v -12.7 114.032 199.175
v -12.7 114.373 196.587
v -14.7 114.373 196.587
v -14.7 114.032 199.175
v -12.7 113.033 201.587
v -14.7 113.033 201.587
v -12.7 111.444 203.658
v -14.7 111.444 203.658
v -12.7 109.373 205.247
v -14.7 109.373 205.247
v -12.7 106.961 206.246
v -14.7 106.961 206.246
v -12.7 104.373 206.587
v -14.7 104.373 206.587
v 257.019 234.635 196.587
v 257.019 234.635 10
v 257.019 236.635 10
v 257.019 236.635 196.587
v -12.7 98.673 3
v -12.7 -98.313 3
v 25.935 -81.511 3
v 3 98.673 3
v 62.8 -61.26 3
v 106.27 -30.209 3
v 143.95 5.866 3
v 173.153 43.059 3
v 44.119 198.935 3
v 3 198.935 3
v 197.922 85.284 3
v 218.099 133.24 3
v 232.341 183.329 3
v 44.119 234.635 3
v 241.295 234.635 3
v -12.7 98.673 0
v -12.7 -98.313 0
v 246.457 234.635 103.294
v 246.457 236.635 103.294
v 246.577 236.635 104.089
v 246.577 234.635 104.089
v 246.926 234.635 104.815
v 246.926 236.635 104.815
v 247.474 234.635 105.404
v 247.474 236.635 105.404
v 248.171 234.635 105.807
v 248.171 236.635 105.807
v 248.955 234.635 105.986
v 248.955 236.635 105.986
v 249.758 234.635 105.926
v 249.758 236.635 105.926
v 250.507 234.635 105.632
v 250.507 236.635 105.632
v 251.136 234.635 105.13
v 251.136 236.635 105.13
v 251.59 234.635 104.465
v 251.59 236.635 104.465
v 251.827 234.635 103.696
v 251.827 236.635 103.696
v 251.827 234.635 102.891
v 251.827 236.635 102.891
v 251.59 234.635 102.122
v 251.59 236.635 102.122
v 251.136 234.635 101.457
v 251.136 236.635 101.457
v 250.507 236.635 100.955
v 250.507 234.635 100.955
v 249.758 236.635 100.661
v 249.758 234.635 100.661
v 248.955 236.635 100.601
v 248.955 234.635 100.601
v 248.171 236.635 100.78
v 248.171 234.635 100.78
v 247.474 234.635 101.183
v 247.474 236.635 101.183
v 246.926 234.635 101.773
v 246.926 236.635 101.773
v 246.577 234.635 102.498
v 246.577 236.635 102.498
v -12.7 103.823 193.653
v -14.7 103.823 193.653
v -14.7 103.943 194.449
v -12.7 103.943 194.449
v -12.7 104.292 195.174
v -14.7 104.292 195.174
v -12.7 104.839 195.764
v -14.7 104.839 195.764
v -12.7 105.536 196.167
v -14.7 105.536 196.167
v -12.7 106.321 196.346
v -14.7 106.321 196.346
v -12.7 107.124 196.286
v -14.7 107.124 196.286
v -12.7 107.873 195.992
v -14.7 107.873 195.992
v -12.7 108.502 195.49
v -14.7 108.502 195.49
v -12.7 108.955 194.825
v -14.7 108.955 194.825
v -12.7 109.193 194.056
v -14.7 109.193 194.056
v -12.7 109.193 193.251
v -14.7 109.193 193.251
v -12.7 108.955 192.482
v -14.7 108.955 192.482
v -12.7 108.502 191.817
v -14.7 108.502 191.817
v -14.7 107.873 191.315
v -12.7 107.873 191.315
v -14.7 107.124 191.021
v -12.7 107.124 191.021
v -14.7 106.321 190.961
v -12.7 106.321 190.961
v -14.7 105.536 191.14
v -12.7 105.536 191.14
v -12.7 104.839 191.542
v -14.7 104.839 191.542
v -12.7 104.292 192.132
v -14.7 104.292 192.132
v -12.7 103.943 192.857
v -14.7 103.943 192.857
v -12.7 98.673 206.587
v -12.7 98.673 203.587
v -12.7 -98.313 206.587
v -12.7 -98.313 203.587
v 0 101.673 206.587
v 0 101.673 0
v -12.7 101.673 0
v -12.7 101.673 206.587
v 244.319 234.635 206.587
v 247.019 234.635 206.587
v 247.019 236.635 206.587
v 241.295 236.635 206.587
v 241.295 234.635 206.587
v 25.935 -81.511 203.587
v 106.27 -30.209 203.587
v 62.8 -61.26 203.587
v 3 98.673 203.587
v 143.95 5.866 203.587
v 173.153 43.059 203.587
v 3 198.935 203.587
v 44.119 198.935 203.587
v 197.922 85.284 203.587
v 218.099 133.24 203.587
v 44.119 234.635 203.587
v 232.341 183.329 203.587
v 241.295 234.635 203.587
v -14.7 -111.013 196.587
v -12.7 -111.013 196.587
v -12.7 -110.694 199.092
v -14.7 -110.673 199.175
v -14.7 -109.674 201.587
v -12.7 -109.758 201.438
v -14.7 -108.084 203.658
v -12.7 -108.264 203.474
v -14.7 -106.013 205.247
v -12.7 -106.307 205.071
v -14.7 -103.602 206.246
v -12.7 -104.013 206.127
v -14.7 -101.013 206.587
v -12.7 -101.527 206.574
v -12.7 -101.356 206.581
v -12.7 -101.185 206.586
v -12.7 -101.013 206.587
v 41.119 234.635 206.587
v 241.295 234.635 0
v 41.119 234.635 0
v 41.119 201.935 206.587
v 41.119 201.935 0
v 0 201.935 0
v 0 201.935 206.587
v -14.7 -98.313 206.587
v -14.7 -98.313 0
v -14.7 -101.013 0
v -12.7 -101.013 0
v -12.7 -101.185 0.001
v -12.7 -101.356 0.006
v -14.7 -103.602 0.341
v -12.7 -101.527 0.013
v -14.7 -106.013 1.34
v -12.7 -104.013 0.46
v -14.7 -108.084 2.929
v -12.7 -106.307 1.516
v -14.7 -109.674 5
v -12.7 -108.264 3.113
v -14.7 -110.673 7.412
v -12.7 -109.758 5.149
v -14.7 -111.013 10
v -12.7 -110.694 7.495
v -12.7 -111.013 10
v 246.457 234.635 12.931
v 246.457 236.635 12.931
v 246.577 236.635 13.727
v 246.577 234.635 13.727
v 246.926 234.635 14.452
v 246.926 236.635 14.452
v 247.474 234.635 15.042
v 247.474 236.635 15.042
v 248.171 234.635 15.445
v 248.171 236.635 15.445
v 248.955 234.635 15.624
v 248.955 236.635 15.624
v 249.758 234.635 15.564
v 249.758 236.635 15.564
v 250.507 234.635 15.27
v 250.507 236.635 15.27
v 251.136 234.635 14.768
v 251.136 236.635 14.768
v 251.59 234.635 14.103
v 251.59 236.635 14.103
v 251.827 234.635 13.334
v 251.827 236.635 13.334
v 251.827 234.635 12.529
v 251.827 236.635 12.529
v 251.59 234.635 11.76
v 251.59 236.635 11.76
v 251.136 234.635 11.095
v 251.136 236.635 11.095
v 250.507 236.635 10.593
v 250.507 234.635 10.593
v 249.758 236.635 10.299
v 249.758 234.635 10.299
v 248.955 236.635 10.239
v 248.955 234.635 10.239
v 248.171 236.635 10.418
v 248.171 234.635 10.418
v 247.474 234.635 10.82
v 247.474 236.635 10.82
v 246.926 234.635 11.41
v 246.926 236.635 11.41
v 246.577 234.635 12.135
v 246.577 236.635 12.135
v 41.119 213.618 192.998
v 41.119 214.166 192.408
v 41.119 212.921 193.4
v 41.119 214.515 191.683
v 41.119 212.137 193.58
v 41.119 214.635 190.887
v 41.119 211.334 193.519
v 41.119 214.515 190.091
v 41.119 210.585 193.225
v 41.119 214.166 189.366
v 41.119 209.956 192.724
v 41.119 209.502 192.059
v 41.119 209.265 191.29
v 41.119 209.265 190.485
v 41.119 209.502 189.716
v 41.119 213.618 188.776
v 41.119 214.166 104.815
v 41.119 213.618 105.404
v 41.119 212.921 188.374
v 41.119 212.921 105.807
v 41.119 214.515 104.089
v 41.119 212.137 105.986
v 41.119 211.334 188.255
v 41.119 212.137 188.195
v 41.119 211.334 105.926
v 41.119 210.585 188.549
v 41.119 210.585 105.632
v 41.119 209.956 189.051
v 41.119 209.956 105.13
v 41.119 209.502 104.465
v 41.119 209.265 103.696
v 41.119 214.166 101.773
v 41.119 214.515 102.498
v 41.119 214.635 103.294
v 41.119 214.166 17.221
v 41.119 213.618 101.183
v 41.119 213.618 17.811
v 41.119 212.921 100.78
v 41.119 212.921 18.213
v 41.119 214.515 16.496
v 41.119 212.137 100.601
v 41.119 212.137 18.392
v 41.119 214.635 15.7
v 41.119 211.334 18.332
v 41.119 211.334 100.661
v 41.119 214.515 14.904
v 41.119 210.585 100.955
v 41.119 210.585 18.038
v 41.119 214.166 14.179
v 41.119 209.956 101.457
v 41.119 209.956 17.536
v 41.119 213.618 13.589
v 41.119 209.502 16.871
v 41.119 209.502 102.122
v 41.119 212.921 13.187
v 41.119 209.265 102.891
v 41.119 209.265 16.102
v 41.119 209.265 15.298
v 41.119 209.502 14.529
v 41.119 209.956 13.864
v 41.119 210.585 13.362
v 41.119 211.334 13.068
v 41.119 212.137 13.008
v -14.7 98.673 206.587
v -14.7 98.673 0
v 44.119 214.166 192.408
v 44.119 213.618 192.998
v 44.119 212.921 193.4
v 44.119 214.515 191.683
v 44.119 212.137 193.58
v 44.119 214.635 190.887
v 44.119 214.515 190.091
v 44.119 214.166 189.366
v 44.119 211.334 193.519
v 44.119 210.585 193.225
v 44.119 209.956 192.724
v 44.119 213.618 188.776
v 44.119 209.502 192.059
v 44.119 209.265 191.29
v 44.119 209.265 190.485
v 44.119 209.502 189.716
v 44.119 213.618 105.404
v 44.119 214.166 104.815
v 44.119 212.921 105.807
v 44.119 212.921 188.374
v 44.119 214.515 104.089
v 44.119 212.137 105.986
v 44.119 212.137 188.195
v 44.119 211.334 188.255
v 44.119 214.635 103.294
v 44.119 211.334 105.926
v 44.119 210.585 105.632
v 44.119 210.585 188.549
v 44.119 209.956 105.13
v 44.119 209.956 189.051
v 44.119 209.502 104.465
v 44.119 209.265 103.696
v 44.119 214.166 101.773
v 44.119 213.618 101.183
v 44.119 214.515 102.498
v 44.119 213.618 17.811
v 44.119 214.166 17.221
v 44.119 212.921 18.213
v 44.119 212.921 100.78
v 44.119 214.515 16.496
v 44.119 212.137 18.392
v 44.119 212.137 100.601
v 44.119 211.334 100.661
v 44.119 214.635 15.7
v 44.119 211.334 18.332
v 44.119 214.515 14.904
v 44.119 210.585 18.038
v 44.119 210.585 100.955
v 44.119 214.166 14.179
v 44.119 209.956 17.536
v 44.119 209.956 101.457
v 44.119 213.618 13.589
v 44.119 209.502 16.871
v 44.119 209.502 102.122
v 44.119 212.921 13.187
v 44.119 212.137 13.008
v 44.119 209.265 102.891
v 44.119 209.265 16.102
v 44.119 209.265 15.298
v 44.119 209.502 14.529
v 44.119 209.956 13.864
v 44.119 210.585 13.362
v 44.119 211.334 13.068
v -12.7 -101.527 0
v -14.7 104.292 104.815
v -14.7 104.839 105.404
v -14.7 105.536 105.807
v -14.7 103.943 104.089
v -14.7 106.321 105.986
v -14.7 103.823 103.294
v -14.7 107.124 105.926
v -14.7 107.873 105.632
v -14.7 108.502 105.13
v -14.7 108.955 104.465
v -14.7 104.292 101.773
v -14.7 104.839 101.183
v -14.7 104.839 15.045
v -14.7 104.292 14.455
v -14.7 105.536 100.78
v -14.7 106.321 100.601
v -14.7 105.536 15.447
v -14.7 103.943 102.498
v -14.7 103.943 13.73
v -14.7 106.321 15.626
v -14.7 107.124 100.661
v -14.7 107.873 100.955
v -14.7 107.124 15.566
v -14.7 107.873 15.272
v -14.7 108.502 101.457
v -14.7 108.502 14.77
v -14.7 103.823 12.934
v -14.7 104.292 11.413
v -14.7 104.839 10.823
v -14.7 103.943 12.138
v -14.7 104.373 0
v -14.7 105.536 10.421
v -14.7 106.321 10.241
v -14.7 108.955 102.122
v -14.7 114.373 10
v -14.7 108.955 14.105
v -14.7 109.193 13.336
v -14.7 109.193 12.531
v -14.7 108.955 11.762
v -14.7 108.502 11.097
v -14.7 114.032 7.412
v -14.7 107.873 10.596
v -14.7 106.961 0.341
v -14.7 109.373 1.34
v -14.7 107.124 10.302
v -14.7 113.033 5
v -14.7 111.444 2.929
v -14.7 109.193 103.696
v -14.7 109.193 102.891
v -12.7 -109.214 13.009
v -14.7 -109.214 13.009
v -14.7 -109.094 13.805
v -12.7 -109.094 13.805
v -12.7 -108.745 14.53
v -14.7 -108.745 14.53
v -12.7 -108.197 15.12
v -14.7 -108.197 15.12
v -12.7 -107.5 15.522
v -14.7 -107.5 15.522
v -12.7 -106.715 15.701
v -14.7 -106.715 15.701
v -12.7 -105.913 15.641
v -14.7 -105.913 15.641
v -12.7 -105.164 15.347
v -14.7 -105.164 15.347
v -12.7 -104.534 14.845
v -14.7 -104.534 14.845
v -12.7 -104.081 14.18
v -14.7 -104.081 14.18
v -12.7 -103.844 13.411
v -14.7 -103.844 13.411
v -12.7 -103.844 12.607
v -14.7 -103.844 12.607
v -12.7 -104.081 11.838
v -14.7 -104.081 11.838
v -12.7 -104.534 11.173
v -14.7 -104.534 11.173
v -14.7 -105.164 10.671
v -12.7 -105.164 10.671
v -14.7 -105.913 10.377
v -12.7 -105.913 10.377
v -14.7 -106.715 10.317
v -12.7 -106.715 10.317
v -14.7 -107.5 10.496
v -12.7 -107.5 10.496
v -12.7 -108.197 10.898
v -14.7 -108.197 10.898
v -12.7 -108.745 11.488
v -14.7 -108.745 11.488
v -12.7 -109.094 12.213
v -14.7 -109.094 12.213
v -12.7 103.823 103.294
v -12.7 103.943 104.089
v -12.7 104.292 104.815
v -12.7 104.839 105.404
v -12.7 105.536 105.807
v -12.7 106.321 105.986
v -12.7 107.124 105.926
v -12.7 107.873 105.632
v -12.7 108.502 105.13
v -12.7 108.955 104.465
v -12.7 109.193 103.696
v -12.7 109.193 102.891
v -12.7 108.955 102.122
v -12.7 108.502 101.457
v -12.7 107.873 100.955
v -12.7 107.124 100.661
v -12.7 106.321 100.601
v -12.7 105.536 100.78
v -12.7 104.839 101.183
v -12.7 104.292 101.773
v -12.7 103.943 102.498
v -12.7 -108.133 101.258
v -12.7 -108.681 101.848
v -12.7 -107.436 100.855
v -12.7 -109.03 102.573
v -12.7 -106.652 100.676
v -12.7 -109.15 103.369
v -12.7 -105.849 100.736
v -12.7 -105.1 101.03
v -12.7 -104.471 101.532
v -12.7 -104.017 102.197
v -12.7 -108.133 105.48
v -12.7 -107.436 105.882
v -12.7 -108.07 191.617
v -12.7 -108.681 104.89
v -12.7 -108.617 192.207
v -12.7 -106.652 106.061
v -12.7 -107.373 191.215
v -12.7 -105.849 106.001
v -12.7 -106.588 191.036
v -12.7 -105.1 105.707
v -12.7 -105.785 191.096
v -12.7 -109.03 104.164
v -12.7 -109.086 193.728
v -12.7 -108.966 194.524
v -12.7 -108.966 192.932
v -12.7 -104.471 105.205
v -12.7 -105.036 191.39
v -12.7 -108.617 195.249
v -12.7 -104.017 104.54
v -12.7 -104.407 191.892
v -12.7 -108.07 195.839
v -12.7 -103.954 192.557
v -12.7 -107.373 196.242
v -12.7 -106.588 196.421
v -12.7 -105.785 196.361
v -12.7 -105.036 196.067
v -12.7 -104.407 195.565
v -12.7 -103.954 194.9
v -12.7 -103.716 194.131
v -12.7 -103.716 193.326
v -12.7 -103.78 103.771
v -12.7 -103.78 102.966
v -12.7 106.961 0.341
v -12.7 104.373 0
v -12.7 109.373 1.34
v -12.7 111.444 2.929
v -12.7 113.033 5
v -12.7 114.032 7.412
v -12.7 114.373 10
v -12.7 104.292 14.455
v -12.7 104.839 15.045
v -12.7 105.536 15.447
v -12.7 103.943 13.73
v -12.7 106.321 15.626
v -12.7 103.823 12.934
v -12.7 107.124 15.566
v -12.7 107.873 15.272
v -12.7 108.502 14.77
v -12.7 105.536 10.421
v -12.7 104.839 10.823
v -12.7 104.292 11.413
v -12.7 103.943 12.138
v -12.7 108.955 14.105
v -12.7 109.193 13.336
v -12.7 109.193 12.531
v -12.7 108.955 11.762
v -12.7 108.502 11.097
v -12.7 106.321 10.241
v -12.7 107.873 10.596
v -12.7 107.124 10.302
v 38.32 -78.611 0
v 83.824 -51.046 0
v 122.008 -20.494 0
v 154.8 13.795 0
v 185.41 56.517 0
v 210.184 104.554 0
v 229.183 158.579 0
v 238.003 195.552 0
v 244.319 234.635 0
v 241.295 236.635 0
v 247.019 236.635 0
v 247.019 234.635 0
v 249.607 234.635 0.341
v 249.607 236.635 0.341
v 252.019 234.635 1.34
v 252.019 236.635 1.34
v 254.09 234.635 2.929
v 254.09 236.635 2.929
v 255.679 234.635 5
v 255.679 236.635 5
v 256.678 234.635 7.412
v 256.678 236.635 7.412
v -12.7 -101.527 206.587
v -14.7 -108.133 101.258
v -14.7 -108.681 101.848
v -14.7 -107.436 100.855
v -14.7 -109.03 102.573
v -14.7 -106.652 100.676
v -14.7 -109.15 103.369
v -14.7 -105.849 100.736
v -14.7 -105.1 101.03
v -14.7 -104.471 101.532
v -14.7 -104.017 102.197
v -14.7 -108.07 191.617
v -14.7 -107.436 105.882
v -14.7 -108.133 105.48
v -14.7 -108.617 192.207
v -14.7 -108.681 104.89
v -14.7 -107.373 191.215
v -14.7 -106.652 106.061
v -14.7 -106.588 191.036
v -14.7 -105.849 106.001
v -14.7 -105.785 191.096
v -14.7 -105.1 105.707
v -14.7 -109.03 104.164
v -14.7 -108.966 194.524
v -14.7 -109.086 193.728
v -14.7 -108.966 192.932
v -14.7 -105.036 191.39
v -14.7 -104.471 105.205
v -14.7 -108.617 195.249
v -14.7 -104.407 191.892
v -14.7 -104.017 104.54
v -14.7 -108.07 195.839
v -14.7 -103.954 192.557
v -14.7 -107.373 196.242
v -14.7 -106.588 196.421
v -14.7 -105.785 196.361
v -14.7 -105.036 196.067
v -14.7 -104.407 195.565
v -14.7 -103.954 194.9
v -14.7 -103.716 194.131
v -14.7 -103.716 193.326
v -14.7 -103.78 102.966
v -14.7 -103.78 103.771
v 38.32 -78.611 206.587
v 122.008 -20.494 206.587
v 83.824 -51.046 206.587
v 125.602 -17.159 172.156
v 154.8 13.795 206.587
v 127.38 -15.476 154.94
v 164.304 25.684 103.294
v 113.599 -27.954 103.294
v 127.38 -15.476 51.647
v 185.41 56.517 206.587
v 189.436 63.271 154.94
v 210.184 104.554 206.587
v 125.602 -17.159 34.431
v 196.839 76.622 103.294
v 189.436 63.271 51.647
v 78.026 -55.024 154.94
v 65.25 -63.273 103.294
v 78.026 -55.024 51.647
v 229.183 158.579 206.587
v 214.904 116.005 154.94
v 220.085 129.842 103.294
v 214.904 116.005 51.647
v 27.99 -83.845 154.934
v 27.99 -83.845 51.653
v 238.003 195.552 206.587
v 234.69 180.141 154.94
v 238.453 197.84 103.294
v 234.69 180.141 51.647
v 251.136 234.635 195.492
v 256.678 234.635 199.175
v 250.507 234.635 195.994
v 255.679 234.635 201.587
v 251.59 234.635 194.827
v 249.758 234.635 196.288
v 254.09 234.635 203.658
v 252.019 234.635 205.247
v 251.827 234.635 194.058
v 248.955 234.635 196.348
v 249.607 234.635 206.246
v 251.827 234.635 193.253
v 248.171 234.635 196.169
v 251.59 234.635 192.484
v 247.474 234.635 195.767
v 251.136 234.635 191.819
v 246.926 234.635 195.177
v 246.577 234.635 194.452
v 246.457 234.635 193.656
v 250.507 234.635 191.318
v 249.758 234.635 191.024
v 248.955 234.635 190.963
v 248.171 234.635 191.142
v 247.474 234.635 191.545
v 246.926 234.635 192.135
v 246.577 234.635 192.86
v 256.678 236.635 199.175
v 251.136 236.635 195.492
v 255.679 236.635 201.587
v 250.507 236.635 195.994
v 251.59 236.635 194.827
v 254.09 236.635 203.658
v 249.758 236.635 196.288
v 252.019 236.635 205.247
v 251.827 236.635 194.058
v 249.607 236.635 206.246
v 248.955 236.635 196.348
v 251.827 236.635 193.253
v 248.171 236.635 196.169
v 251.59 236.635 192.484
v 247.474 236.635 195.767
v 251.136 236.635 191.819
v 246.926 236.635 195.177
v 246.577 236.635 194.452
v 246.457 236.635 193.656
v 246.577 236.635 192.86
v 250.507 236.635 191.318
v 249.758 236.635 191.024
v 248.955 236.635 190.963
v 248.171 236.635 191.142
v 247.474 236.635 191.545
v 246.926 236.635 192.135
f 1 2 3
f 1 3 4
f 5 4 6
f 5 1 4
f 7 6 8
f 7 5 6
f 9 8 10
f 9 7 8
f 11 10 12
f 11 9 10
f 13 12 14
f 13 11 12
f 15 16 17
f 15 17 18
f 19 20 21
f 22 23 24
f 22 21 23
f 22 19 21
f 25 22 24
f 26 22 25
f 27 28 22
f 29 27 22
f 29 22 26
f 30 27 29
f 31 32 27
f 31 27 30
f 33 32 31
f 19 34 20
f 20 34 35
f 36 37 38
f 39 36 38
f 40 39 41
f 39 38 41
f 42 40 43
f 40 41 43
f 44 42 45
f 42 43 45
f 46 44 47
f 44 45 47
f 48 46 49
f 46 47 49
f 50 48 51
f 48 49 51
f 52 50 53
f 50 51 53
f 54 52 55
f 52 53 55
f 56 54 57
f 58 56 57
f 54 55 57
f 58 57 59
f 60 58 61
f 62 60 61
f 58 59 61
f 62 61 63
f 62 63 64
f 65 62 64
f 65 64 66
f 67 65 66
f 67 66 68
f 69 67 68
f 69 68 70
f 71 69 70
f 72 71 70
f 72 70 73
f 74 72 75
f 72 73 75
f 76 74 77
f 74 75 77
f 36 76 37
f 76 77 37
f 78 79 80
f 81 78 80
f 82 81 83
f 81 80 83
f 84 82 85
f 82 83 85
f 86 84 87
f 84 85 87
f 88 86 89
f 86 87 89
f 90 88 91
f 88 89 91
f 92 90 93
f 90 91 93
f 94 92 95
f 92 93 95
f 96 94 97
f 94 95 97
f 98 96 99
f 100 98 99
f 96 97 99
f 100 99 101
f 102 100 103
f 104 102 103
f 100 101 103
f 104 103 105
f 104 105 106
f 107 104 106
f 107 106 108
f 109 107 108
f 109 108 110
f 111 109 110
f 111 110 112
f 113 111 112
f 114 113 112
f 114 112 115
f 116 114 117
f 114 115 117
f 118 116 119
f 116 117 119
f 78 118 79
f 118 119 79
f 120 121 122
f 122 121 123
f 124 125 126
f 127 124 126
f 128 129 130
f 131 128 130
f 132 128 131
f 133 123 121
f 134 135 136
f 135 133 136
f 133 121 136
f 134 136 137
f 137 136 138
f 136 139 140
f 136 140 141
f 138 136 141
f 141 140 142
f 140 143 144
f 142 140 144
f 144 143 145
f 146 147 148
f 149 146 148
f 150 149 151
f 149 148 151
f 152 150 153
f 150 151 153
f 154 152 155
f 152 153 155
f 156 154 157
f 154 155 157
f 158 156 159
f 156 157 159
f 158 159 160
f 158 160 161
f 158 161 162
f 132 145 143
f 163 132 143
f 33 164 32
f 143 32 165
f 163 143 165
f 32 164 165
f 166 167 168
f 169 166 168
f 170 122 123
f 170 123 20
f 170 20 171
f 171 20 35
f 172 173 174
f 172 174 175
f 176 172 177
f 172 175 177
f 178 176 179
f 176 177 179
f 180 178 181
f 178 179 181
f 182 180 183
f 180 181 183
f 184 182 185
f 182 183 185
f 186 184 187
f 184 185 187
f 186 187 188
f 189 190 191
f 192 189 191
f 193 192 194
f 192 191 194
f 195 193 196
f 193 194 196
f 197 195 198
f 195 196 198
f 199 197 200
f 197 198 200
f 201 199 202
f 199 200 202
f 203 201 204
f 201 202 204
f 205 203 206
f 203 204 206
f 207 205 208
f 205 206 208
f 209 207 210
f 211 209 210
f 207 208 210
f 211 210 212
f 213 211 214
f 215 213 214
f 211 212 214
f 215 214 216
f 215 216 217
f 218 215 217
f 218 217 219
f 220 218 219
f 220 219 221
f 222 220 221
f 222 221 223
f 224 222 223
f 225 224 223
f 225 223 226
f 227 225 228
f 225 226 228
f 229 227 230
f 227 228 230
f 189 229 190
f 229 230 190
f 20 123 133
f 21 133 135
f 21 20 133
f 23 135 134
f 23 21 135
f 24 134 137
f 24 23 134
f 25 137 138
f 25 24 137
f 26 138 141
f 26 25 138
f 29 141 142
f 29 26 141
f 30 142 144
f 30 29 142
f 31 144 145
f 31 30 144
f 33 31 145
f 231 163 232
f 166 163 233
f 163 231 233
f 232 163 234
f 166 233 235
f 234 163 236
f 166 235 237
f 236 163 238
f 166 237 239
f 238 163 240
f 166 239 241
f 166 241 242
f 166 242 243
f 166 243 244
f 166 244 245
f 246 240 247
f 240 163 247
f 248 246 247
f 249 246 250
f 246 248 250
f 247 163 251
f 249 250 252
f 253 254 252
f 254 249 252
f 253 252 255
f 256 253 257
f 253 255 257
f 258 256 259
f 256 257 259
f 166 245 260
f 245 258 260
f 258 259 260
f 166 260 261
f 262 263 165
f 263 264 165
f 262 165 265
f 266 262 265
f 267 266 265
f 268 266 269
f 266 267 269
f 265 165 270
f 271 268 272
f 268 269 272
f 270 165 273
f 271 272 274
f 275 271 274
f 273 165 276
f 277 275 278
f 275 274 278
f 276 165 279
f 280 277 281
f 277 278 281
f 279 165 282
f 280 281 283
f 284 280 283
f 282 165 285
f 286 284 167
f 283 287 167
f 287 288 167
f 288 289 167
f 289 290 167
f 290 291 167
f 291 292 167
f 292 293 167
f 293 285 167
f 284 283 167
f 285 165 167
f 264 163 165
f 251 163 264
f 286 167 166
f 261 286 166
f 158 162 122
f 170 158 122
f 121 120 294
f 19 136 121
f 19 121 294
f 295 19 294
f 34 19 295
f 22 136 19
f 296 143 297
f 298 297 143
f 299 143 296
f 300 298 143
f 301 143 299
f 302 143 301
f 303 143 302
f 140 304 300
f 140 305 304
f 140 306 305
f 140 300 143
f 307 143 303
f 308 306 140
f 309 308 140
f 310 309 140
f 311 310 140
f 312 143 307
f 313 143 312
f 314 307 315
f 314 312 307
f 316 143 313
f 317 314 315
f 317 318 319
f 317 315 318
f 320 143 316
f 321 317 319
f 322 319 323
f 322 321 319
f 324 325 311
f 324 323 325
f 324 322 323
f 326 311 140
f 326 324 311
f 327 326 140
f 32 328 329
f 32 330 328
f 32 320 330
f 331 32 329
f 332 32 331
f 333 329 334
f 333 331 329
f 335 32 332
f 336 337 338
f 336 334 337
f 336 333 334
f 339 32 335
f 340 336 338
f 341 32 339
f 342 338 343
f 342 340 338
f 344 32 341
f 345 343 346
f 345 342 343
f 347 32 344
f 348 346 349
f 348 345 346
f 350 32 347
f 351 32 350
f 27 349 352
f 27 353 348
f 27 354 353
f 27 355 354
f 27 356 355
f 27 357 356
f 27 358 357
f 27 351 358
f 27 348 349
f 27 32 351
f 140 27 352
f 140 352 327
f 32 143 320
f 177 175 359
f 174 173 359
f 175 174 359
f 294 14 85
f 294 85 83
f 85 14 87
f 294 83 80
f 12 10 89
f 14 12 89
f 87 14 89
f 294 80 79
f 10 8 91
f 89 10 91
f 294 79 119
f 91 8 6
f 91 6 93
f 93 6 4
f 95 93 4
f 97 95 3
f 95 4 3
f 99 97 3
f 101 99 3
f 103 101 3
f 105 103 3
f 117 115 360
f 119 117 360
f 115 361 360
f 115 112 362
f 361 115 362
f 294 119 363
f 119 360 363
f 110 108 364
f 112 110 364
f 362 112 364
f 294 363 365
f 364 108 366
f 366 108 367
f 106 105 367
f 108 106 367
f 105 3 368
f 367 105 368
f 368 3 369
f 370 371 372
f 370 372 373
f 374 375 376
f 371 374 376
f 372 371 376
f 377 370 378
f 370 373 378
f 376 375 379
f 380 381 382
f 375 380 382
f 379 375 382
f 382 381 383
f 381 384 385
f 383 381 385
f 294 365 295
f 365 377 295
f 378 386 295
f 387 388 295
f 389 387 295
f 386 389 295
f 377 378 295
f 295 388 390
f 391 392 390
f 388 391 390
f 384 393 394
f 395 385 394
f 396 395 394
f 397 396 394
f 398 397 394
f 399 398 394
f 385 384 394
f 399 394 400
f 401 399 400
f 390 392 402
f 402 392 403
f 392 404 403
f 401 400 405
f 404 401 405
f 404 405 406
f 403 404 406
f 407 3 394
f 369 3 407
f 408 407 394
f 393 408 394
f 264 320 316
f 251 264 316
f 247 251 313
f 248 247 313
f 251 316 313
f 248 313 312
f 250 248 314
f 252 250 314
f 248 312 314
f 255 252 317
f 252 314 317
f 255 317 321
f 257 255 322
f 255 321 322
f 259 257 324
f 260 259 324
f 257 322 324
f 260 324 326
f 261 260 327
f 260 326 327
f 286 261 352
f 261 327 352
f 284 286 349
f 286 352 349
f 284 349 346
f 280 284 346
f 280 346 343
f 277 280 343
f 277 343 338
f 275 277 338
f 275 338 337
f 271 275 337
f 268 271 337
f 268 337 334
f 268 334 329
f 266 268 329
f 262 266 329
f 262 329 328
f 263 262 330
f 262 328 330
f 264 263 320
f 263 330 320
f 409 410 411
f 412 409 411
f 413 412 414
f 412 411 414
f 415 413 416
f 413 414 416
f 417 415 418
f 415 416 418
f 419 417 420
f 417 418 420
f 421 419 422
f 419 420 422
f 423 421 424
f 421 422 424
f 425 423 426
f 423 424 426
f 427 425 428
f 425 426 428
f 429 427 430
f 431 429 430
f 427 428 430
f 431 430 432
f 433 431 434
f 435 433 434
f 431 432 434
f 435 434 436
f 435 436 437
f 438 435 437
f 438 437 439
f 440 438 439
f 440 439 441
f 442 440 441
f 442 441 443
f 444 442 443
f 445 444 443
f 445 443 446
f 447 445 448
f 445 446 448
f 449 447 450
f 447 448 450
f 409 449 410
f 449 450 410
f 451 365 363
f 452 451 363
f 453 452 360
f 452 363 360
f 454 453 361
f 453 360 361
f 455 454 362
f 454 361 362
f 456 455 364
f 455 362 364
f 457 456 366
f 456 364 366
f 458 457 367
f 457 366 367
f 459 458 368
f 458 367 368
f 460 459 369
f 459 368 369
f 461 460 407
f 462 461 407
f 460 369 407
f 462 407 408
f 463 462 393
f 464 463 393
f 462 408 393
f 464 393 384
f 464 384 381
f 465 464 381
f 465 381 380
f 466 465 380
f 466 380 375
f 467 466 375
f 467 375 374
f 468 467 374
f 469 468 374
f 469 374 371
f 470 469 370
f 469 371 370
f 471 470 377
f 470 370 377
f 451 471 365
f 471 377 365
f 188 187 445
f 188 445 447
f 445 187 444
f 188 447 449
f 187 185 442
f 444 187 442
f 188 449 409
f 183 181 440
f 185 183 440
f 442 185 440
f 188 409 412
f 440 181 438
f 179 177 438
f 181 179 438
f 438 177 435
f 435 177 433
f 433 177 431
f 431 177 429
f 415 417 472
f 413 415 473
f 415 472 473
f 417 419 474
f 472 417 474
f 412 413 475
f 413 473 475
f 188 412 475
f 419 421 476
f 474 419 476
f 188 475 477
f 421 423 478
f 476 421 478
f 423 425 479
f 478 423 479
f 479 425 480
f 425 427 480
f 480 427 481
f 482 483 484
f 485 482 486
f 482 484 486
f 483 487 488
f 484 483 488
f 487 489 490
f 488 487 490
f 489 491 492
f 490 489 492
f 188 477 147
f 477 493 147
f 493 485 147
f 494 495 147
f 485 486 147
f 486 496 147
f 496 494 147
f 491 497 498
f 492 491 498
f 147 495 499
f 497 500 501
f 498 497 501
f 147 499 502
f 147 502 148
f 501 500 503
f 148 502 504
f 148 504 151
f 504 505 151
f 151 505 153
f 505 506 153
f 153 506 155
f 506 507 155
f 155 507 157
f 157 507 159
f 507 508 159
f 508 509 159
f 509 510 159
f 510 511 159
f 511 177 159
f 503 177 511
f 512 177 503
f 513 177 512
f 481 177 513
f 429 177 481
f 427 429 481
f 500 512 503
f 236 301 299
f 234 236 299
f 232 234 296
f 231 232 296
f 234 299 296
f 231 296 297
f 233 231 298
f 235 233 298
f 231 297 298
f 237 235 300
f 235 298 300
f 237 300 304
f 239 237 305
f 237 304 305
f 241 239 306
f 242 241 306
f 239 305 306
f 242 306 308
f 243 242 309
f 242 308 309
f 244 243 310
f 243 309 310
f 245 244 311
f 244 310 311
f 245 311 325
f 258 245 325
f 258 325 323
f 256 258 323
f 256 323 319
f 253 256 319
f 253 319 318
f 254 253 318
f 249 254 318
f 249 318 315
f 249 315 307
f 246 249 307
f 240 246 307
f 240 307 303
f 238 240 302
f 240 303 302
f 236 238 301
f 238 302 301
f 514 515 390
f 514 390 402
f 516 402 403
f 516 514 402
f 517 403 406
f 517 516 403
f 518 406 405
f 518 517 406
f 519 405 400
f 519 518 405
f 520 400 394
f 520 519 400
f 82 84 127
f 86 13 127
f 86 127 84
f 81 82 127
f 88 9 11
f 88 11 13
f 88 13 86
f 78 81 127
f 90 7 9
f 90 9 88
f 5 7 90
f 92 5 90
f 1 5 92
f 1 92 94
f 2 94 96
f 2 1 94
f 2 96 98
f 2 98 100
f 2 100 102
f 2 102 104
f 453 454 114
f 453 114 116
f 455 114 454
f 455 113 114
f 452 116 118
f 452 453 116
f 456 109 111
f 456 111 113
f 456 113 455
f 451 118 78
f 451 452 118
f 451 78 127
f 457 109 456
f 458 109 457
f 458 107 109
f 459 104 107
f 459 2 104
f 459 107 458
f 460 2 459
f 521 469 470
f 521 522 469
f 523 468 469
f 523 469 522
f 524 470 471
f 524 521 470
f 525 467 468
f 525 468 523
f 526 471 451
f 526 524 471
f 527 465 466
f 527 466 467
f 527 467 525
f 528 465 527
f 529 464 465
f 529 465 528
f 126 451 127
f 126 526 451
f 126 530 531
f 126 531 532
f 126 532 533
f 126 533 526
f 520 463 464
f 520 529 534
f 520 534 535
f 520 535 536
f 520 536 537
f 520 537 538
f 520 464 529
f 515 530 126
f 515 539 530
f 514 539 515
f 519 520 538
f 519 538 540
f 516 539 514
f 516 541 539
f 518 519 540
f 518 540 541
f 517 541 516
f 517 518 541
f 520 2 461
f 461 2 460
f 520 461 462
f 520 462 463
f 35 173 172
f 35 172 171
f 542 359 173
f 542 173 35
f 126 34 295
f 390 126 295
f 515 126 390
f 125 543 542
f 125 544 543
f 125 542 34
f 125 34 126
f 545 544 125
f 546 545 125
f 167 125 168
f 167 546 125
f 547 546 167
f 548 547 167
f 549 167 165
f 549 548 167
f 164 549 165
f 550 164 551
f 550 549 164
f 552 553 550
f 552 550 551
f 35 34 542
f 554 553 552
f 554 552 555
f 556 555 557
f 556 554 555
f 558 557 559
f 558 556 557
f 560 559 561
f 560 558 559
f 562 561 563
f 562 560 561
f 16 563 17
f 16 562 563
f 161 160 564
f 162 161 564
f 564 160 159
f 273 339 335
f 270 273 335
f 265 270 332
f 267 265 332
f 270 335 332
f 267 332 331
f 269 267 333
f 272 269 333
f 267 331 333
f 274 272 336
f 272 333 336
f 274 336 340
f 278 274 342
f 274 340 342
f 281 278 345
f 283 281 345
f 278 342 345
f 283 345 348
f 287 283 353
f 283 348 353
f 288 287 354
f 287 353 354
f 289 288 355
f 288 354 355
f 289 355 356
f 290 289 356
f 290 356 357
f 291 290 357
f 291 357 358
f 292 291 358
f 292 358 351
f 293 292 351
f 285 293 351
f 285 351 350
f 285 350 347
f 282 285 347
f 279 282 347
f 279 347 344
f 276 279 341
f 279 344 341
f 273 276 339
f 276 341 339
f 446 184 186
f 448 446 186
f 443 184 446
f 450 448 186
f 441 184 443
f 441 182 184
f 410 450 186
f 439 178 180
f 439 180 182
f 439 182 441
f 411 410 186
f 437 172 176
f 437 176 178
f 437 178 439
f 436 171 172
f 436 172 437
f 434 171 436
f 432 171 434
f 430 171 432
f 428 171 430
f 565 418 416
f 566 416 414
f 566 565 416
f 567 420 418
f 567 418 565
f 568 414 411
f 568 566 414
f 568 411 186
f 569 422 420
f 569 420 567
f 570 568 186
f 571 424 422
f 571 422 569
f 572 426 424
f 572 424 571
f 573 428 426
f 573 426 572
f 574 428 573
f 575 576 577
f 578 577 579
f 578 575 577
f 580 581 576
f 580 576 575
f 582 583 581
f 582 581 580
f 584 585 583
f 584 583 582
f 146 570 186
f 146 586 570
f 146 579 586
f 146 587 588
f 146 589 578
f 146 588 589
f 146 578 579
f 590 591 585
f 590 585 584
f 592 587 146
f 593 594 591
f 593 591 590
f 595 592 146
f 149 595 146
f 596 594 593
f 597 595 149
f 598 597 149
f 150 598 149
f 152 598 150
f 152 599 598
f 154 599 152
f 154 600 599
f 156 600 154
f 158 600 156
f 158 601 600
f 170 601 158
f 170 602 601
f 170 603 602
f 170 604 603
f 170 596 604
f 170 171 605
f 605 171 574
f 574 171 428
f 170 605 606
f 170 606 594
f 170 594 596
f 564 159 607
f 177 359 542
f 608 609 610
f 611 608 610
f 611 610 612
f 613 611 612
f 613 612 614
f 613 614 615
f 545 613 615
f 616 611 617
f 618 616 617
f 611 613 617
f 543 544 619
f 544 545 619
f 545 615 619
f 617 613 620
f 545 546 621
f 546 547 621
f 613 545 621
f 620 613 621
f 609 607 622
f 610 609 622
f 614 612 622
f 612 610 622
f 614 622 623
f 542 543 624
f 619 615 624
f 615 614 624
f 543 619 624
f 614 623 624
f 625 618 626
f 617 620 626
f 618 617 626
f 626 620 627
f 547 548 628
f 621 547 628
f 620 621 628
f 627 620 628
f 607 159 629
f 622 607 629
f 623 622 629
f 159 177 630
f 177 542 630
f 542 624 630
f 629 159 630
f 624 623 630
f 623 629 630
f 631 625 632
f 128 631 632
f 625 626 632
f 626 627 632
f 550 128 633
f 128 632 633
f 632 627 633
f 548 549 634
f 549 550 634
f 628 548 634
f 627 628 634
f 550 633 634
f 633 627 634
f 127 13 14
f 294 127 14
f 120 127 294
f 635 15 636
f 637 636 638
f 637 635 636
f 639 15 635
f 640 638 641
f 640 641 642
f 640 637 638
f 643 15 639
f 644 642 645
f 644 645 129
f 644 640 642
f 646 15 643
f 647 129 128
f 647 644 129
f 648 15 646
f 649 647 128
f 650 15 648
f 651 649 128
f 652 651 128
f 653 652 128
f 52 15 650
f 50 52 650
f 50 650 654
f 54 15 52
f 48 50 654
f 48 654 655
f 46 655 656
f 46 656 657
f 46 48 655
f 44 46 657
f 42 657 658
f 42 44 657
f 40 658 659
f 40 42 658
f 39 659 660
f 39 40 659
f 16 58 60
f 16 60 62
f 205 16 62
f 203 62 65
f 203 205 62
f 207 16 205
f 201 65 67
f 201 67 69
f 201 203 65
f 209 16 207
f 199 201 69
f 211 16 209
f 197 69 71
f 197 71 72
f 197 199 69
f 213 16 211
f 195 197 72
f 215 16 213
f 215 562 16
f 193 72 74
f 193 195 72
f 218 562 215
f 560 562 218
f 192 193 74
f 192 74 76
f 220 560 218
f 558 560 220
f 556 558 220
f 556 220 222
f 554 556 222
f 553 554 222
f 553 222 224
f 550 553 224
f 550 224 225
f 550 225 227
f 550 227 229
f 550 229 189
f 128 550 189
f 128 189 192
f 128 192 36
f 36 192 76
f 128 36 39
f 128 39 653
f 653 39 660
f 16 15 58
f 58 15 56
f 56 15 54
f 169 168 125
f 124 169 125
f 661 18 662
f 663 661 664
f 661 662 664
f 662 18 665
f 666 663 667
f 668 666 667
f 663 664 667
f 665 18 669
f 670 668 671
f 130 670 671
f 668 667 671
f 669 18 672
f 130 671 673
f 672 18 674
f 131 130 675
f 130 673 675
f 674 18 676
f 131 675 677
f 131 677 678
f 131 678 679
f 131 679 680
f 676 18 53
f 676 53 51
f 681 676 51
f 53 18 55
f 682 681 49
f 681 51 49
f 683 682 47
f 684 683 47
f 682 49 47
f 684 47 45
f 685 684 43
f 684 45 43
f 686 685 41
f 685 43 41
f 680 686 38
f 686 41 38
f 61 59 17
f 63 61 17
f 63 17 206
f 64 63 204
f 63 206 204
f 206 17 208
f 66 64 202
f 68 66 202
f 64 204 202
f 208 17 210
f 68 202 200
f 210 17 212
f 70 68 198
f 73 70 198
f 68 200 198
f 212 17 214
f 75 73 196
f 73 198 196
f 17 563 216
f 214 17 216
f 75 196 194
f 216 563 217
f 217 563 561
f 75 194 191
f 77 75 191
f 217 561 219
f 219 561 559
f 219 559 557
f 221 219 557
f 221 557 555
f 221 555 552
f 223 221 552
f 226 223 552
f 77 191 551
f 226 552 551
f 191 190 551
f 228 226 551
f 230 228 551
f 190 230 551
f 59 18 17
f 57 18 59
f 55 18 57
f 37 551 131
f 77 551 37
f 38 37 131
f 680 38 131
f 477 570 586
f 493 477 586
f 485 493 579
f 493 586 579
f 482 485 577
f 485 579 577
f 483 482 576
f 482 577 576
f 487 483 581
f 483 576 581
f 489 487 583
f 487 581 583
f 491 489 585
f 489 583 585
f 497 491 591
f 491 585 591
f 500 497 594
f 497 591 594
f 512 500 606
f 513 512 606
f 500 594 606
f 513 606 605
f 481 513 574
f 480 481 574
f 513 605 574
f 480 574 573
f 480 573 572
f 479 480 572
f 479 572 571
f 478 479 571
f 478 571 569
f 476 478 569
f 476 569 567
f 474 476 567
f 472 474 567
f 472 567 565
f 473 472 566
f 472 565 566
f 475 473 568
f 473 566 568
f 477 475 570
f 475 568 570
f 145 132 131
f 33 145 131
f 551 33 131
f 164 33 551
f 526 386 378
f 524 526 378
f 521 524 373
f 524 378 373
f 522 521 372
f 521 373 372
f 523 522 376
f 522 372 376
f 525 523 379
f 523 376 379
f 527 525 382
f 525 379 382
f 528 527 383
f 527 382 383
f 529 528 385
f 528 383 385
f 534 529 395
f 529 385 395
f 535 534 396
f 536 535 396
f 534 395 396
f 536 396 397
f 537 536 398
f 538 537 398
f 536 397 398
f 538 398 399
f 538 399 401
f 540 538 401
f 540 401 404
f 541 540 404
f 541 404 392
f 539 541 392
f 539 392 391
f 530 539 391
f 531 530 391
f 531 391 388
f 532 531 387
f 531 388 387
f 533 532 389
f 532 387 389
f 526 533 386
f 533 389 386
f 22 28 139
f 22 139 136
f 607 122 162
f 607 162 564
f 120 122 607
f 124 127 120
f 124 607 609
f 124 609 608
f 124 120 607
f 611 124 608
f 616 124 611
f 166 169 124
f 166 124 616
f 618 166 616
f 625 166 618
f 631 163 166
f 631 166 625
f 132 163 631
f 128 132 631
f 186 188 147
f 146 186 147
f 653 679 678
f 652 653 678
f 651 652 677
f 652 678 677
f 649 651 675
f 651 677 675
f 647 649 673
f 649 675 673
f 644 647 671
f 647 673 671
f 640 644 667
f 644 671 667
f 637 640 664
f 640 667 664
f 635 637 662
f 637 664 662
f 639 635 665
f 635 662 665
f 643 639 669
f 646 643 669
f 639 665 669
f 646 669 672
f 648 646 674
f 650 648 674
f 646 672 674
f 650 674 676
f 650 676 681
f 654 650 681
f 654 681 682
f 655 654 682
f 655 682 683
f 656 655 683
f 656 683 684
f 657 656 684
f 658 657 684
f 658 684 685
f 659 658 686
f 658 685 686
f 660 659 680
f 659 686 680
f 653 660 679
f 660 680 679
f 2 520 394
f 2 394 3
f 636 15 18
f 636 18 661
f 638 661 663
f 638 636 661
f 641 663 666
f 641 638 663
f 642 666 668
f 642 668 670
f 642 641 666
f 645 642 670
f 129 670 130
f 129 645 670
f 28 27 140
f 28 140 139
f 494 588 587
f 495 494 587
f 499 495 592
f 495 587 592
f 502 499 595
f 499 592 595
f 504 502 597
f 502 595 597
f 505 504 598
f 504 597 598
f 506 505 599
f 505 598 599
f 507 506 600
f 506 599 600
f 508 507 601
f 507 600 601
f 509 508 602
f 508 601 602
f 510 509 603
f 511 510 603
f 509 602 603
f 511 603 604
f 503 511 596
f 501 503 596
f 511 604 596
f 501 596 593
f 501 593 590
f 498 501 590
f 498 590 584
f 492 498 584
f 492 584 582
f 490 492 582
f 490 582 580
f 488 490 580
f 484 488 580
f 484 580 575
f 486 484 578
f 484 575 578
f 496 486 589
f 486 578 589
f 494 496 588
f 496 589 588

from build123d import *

# Parameters (mm, degrees)
BOSS_EXTRUDE3_DEPTH = 206.587093
SHELL1_T            = -3
BOSS_EXTRUDE4_DEPTH = 2
BOSS_EXTRUDE5_DEPTH = 2
SKETCH8_R           = 2.7
CUT_EXTRUDE2_DEPTH  = 3
SKETCH9_R           = 2.7
CUT_EXTRUDE3_DEPTH  = 2
SKETCH11_R          = 2.7
CUT_EXTRUDE4_DEPTH  = 2


with BuildPart() as part:
    # Sketch1 → Boss-Extrude3 (new body)
    with BuildSketch(Plane.XY):
        with BuildLine():
            Line((244.319092767, 234.634840909), (41.119092767, 234.634840909))
            Line((41.119092767, 234.634840909), (41.119092767, 201.934840909))
            Line((41.119092767, 201.934840909), (0, 201.934840909))
            Line((0, 201.934840909), (0, 101.672858907))
            Line((0, 101.672858907), (-12.7, 101.672858907))
            Line((-12.7, 101.672858907), (-12.7, -101.527141093))
            add(Edge.make_bspline(
                [(-12.7, -101.527141093), (212.797902698, -15.185130796), (244.319092767, 234.634840909)],
                knots=[0, 0, 0, 1, 1, 1], degree=2))
        make_face()
    extrude(amount=BOSS_EXTRUDE3_DEPTH)

    # Shell1
    shell1_openings = [part.faces().sort_by_distance(p)[0] for p in [
        (142.719092767, 234.634840909, 103.2935465),
        (-12.7, 0.072858907, 103.2935465),
    ]]
    offset(amount=SHELL1_T, openings=shell1_openings, kind=Kind.INTERSECTION)

    # Sketch4 → Boss-Extrude4 (add)
    with BuildSketch(Plane(origin=(0, 234.634840909, 0), x_dir=(1, 0, 0), z_dir=(0, 1, 0))):
        with BuildLine():
            Line((257.019092767, -10), (257.019092767, -196.587092864))
            ThreePointArc((257.019092767, -196.587092864), (254.090160579, -203.658160676), (247.019092767, -206.587092864))
            Line((247.019092767, -206.587092864), (244.319092767, -206.587092864))
            Line((244.319092767, -206.587092864), (241.295184716, -206.587092864))
            Line((241.295184716, -206.587092864), (241.295184716, 0))
            Line((241.295184716, 0), (247.019092767, 0))
            ThreePointArc((247.019092767, 0), (254.090160579, -2.928932188), (257.019092767, -10))
        make_face()
    extrude(amount=BOSS_EXTRUDE4_DEPTH)

    # Sketch5 → Boss-Extrude5 (add)
    with BuildSketch(Plane.ZY.offset(12.7)):
        with BuildLine():
            Line((10, 114.372858907), (196.587092864, 114.372858907))
            ThreePointArc((196.587092864, 114.372858907), (203.658160676, 111.443926719), (206.587092864, 104.372858907))
            Line((206.587092864, 104.372858907), (206.587092864, 98.672858907))
            Line((206.587092864, 98.672858907), (0, 98.672858907))
            Line((0, 98.672858907), (0, 104.372858907))
            ThreePointArc((0, 104.372858907), (2.928932188, 111.443926719), (10, 114.372858907))
        make_face()
        with BuildLine():
            Line((0, -98.313391167), (0, -101.013391167))
            ThreePointArc((0, -101.013391167), (2.928932188, -108.084458979), (10, -111.013391167))
            Line((10, -111.013391167), (196.587092864, -111.013391167))
            ThreePointArc((196.587092864, -111.013391167), (203.658160676, -108.084458979), (206.587092864, -101.013391167))
            Line((206.587092864, -101.013391167), (206.587092864, -98.313391167))
            Line((206.587092864, -98.313391167), (0, -98.313391167))
        make_face()
    extrude(amount=BOSS_EXTRUDE5_DEPTH)

    # Sketch8 → Cut-Extrude2 (cut)
    with BuildSketch(Plane(origin=(44.119092767, 0, 0), x_dir=(0, 0, -1), z_dir=(1, 0, 0))):
        with Locations(Location((-190.887092864, 211.934840909, 0), (0, 0, 90))):
            Circle(SKETCH8_R)
        with Locations(Location((-103.293546432, 211.934840909, 0), (0, 0, 90))):
            Circle(SKETCH8_R)
        with Locations(Location((-15.7, 211.934840909, 0), (0, 0, 90))):
            Circle(SKETCH8_R)
    extrude(amount=-CUT_EXTRUDE2_DEPTH, mode=Mode.SUBTRACT)

    # Sketch9 → Cut-Extrude3 (cut)
    with BuildSketch(Plane(origin=(0, 236.634840909, 0), x_dir=(1, 0, 0), z_dir=(0, 1, 0))):
        with Locations(Location((249.157138742, -12.931235523, 0), (0, 0, 180))):
            Circle(SKETCH9_R)
        with Locations(Location((249.157138742, -103.293546432, 0), (0, 0, 180))):
            Circle(SKETCH9_R)
        with Locations(Location((249.157138742, -193.655857341, 0), (0, 0, 180))):
            Circle(SKETCH9_R)
    extrude(amount=-CUT_EXTRUDE3_DEPTH, mode=Mode.SUBTRACT)

    # Sketch11 → Cut-Extrude4 (cut)
    with BuildSketch(Plane.ZY.offset(14.7)):
        with Locations(Location((12.933859514, 106.522858907, 0), (0, 0, 270))):
            Circle(SKETCH11_R)
        with Locations(Location((103.293546432, 106.522858907, 0), (0, 0, 270))):
            Circle(SKETCH11_R)
        with Locations(Location((193.653233351, 106.522858907, 0), (0, 0, 270))):
            Circle(SKETCH11_R)
        with Locations(Location((193.728321895, -106.386237609, 0), (0, 0, 270))):
            Circle(SKETCH11_R)
        with Locations(Location((103.368657455, -106.44997351, 0), (0, 0, 270))):
            Circle(SKETCH11_R)
        with Locations(Location((13.008993014, -106.51370941, 0), (0, 0, 270))):
            Circle(SKETCH11_R)
    extrude(amount=-CUT_EXTRUDE4_DEPTH, mode=Mode.SUBTRACT)


solid = part.part
